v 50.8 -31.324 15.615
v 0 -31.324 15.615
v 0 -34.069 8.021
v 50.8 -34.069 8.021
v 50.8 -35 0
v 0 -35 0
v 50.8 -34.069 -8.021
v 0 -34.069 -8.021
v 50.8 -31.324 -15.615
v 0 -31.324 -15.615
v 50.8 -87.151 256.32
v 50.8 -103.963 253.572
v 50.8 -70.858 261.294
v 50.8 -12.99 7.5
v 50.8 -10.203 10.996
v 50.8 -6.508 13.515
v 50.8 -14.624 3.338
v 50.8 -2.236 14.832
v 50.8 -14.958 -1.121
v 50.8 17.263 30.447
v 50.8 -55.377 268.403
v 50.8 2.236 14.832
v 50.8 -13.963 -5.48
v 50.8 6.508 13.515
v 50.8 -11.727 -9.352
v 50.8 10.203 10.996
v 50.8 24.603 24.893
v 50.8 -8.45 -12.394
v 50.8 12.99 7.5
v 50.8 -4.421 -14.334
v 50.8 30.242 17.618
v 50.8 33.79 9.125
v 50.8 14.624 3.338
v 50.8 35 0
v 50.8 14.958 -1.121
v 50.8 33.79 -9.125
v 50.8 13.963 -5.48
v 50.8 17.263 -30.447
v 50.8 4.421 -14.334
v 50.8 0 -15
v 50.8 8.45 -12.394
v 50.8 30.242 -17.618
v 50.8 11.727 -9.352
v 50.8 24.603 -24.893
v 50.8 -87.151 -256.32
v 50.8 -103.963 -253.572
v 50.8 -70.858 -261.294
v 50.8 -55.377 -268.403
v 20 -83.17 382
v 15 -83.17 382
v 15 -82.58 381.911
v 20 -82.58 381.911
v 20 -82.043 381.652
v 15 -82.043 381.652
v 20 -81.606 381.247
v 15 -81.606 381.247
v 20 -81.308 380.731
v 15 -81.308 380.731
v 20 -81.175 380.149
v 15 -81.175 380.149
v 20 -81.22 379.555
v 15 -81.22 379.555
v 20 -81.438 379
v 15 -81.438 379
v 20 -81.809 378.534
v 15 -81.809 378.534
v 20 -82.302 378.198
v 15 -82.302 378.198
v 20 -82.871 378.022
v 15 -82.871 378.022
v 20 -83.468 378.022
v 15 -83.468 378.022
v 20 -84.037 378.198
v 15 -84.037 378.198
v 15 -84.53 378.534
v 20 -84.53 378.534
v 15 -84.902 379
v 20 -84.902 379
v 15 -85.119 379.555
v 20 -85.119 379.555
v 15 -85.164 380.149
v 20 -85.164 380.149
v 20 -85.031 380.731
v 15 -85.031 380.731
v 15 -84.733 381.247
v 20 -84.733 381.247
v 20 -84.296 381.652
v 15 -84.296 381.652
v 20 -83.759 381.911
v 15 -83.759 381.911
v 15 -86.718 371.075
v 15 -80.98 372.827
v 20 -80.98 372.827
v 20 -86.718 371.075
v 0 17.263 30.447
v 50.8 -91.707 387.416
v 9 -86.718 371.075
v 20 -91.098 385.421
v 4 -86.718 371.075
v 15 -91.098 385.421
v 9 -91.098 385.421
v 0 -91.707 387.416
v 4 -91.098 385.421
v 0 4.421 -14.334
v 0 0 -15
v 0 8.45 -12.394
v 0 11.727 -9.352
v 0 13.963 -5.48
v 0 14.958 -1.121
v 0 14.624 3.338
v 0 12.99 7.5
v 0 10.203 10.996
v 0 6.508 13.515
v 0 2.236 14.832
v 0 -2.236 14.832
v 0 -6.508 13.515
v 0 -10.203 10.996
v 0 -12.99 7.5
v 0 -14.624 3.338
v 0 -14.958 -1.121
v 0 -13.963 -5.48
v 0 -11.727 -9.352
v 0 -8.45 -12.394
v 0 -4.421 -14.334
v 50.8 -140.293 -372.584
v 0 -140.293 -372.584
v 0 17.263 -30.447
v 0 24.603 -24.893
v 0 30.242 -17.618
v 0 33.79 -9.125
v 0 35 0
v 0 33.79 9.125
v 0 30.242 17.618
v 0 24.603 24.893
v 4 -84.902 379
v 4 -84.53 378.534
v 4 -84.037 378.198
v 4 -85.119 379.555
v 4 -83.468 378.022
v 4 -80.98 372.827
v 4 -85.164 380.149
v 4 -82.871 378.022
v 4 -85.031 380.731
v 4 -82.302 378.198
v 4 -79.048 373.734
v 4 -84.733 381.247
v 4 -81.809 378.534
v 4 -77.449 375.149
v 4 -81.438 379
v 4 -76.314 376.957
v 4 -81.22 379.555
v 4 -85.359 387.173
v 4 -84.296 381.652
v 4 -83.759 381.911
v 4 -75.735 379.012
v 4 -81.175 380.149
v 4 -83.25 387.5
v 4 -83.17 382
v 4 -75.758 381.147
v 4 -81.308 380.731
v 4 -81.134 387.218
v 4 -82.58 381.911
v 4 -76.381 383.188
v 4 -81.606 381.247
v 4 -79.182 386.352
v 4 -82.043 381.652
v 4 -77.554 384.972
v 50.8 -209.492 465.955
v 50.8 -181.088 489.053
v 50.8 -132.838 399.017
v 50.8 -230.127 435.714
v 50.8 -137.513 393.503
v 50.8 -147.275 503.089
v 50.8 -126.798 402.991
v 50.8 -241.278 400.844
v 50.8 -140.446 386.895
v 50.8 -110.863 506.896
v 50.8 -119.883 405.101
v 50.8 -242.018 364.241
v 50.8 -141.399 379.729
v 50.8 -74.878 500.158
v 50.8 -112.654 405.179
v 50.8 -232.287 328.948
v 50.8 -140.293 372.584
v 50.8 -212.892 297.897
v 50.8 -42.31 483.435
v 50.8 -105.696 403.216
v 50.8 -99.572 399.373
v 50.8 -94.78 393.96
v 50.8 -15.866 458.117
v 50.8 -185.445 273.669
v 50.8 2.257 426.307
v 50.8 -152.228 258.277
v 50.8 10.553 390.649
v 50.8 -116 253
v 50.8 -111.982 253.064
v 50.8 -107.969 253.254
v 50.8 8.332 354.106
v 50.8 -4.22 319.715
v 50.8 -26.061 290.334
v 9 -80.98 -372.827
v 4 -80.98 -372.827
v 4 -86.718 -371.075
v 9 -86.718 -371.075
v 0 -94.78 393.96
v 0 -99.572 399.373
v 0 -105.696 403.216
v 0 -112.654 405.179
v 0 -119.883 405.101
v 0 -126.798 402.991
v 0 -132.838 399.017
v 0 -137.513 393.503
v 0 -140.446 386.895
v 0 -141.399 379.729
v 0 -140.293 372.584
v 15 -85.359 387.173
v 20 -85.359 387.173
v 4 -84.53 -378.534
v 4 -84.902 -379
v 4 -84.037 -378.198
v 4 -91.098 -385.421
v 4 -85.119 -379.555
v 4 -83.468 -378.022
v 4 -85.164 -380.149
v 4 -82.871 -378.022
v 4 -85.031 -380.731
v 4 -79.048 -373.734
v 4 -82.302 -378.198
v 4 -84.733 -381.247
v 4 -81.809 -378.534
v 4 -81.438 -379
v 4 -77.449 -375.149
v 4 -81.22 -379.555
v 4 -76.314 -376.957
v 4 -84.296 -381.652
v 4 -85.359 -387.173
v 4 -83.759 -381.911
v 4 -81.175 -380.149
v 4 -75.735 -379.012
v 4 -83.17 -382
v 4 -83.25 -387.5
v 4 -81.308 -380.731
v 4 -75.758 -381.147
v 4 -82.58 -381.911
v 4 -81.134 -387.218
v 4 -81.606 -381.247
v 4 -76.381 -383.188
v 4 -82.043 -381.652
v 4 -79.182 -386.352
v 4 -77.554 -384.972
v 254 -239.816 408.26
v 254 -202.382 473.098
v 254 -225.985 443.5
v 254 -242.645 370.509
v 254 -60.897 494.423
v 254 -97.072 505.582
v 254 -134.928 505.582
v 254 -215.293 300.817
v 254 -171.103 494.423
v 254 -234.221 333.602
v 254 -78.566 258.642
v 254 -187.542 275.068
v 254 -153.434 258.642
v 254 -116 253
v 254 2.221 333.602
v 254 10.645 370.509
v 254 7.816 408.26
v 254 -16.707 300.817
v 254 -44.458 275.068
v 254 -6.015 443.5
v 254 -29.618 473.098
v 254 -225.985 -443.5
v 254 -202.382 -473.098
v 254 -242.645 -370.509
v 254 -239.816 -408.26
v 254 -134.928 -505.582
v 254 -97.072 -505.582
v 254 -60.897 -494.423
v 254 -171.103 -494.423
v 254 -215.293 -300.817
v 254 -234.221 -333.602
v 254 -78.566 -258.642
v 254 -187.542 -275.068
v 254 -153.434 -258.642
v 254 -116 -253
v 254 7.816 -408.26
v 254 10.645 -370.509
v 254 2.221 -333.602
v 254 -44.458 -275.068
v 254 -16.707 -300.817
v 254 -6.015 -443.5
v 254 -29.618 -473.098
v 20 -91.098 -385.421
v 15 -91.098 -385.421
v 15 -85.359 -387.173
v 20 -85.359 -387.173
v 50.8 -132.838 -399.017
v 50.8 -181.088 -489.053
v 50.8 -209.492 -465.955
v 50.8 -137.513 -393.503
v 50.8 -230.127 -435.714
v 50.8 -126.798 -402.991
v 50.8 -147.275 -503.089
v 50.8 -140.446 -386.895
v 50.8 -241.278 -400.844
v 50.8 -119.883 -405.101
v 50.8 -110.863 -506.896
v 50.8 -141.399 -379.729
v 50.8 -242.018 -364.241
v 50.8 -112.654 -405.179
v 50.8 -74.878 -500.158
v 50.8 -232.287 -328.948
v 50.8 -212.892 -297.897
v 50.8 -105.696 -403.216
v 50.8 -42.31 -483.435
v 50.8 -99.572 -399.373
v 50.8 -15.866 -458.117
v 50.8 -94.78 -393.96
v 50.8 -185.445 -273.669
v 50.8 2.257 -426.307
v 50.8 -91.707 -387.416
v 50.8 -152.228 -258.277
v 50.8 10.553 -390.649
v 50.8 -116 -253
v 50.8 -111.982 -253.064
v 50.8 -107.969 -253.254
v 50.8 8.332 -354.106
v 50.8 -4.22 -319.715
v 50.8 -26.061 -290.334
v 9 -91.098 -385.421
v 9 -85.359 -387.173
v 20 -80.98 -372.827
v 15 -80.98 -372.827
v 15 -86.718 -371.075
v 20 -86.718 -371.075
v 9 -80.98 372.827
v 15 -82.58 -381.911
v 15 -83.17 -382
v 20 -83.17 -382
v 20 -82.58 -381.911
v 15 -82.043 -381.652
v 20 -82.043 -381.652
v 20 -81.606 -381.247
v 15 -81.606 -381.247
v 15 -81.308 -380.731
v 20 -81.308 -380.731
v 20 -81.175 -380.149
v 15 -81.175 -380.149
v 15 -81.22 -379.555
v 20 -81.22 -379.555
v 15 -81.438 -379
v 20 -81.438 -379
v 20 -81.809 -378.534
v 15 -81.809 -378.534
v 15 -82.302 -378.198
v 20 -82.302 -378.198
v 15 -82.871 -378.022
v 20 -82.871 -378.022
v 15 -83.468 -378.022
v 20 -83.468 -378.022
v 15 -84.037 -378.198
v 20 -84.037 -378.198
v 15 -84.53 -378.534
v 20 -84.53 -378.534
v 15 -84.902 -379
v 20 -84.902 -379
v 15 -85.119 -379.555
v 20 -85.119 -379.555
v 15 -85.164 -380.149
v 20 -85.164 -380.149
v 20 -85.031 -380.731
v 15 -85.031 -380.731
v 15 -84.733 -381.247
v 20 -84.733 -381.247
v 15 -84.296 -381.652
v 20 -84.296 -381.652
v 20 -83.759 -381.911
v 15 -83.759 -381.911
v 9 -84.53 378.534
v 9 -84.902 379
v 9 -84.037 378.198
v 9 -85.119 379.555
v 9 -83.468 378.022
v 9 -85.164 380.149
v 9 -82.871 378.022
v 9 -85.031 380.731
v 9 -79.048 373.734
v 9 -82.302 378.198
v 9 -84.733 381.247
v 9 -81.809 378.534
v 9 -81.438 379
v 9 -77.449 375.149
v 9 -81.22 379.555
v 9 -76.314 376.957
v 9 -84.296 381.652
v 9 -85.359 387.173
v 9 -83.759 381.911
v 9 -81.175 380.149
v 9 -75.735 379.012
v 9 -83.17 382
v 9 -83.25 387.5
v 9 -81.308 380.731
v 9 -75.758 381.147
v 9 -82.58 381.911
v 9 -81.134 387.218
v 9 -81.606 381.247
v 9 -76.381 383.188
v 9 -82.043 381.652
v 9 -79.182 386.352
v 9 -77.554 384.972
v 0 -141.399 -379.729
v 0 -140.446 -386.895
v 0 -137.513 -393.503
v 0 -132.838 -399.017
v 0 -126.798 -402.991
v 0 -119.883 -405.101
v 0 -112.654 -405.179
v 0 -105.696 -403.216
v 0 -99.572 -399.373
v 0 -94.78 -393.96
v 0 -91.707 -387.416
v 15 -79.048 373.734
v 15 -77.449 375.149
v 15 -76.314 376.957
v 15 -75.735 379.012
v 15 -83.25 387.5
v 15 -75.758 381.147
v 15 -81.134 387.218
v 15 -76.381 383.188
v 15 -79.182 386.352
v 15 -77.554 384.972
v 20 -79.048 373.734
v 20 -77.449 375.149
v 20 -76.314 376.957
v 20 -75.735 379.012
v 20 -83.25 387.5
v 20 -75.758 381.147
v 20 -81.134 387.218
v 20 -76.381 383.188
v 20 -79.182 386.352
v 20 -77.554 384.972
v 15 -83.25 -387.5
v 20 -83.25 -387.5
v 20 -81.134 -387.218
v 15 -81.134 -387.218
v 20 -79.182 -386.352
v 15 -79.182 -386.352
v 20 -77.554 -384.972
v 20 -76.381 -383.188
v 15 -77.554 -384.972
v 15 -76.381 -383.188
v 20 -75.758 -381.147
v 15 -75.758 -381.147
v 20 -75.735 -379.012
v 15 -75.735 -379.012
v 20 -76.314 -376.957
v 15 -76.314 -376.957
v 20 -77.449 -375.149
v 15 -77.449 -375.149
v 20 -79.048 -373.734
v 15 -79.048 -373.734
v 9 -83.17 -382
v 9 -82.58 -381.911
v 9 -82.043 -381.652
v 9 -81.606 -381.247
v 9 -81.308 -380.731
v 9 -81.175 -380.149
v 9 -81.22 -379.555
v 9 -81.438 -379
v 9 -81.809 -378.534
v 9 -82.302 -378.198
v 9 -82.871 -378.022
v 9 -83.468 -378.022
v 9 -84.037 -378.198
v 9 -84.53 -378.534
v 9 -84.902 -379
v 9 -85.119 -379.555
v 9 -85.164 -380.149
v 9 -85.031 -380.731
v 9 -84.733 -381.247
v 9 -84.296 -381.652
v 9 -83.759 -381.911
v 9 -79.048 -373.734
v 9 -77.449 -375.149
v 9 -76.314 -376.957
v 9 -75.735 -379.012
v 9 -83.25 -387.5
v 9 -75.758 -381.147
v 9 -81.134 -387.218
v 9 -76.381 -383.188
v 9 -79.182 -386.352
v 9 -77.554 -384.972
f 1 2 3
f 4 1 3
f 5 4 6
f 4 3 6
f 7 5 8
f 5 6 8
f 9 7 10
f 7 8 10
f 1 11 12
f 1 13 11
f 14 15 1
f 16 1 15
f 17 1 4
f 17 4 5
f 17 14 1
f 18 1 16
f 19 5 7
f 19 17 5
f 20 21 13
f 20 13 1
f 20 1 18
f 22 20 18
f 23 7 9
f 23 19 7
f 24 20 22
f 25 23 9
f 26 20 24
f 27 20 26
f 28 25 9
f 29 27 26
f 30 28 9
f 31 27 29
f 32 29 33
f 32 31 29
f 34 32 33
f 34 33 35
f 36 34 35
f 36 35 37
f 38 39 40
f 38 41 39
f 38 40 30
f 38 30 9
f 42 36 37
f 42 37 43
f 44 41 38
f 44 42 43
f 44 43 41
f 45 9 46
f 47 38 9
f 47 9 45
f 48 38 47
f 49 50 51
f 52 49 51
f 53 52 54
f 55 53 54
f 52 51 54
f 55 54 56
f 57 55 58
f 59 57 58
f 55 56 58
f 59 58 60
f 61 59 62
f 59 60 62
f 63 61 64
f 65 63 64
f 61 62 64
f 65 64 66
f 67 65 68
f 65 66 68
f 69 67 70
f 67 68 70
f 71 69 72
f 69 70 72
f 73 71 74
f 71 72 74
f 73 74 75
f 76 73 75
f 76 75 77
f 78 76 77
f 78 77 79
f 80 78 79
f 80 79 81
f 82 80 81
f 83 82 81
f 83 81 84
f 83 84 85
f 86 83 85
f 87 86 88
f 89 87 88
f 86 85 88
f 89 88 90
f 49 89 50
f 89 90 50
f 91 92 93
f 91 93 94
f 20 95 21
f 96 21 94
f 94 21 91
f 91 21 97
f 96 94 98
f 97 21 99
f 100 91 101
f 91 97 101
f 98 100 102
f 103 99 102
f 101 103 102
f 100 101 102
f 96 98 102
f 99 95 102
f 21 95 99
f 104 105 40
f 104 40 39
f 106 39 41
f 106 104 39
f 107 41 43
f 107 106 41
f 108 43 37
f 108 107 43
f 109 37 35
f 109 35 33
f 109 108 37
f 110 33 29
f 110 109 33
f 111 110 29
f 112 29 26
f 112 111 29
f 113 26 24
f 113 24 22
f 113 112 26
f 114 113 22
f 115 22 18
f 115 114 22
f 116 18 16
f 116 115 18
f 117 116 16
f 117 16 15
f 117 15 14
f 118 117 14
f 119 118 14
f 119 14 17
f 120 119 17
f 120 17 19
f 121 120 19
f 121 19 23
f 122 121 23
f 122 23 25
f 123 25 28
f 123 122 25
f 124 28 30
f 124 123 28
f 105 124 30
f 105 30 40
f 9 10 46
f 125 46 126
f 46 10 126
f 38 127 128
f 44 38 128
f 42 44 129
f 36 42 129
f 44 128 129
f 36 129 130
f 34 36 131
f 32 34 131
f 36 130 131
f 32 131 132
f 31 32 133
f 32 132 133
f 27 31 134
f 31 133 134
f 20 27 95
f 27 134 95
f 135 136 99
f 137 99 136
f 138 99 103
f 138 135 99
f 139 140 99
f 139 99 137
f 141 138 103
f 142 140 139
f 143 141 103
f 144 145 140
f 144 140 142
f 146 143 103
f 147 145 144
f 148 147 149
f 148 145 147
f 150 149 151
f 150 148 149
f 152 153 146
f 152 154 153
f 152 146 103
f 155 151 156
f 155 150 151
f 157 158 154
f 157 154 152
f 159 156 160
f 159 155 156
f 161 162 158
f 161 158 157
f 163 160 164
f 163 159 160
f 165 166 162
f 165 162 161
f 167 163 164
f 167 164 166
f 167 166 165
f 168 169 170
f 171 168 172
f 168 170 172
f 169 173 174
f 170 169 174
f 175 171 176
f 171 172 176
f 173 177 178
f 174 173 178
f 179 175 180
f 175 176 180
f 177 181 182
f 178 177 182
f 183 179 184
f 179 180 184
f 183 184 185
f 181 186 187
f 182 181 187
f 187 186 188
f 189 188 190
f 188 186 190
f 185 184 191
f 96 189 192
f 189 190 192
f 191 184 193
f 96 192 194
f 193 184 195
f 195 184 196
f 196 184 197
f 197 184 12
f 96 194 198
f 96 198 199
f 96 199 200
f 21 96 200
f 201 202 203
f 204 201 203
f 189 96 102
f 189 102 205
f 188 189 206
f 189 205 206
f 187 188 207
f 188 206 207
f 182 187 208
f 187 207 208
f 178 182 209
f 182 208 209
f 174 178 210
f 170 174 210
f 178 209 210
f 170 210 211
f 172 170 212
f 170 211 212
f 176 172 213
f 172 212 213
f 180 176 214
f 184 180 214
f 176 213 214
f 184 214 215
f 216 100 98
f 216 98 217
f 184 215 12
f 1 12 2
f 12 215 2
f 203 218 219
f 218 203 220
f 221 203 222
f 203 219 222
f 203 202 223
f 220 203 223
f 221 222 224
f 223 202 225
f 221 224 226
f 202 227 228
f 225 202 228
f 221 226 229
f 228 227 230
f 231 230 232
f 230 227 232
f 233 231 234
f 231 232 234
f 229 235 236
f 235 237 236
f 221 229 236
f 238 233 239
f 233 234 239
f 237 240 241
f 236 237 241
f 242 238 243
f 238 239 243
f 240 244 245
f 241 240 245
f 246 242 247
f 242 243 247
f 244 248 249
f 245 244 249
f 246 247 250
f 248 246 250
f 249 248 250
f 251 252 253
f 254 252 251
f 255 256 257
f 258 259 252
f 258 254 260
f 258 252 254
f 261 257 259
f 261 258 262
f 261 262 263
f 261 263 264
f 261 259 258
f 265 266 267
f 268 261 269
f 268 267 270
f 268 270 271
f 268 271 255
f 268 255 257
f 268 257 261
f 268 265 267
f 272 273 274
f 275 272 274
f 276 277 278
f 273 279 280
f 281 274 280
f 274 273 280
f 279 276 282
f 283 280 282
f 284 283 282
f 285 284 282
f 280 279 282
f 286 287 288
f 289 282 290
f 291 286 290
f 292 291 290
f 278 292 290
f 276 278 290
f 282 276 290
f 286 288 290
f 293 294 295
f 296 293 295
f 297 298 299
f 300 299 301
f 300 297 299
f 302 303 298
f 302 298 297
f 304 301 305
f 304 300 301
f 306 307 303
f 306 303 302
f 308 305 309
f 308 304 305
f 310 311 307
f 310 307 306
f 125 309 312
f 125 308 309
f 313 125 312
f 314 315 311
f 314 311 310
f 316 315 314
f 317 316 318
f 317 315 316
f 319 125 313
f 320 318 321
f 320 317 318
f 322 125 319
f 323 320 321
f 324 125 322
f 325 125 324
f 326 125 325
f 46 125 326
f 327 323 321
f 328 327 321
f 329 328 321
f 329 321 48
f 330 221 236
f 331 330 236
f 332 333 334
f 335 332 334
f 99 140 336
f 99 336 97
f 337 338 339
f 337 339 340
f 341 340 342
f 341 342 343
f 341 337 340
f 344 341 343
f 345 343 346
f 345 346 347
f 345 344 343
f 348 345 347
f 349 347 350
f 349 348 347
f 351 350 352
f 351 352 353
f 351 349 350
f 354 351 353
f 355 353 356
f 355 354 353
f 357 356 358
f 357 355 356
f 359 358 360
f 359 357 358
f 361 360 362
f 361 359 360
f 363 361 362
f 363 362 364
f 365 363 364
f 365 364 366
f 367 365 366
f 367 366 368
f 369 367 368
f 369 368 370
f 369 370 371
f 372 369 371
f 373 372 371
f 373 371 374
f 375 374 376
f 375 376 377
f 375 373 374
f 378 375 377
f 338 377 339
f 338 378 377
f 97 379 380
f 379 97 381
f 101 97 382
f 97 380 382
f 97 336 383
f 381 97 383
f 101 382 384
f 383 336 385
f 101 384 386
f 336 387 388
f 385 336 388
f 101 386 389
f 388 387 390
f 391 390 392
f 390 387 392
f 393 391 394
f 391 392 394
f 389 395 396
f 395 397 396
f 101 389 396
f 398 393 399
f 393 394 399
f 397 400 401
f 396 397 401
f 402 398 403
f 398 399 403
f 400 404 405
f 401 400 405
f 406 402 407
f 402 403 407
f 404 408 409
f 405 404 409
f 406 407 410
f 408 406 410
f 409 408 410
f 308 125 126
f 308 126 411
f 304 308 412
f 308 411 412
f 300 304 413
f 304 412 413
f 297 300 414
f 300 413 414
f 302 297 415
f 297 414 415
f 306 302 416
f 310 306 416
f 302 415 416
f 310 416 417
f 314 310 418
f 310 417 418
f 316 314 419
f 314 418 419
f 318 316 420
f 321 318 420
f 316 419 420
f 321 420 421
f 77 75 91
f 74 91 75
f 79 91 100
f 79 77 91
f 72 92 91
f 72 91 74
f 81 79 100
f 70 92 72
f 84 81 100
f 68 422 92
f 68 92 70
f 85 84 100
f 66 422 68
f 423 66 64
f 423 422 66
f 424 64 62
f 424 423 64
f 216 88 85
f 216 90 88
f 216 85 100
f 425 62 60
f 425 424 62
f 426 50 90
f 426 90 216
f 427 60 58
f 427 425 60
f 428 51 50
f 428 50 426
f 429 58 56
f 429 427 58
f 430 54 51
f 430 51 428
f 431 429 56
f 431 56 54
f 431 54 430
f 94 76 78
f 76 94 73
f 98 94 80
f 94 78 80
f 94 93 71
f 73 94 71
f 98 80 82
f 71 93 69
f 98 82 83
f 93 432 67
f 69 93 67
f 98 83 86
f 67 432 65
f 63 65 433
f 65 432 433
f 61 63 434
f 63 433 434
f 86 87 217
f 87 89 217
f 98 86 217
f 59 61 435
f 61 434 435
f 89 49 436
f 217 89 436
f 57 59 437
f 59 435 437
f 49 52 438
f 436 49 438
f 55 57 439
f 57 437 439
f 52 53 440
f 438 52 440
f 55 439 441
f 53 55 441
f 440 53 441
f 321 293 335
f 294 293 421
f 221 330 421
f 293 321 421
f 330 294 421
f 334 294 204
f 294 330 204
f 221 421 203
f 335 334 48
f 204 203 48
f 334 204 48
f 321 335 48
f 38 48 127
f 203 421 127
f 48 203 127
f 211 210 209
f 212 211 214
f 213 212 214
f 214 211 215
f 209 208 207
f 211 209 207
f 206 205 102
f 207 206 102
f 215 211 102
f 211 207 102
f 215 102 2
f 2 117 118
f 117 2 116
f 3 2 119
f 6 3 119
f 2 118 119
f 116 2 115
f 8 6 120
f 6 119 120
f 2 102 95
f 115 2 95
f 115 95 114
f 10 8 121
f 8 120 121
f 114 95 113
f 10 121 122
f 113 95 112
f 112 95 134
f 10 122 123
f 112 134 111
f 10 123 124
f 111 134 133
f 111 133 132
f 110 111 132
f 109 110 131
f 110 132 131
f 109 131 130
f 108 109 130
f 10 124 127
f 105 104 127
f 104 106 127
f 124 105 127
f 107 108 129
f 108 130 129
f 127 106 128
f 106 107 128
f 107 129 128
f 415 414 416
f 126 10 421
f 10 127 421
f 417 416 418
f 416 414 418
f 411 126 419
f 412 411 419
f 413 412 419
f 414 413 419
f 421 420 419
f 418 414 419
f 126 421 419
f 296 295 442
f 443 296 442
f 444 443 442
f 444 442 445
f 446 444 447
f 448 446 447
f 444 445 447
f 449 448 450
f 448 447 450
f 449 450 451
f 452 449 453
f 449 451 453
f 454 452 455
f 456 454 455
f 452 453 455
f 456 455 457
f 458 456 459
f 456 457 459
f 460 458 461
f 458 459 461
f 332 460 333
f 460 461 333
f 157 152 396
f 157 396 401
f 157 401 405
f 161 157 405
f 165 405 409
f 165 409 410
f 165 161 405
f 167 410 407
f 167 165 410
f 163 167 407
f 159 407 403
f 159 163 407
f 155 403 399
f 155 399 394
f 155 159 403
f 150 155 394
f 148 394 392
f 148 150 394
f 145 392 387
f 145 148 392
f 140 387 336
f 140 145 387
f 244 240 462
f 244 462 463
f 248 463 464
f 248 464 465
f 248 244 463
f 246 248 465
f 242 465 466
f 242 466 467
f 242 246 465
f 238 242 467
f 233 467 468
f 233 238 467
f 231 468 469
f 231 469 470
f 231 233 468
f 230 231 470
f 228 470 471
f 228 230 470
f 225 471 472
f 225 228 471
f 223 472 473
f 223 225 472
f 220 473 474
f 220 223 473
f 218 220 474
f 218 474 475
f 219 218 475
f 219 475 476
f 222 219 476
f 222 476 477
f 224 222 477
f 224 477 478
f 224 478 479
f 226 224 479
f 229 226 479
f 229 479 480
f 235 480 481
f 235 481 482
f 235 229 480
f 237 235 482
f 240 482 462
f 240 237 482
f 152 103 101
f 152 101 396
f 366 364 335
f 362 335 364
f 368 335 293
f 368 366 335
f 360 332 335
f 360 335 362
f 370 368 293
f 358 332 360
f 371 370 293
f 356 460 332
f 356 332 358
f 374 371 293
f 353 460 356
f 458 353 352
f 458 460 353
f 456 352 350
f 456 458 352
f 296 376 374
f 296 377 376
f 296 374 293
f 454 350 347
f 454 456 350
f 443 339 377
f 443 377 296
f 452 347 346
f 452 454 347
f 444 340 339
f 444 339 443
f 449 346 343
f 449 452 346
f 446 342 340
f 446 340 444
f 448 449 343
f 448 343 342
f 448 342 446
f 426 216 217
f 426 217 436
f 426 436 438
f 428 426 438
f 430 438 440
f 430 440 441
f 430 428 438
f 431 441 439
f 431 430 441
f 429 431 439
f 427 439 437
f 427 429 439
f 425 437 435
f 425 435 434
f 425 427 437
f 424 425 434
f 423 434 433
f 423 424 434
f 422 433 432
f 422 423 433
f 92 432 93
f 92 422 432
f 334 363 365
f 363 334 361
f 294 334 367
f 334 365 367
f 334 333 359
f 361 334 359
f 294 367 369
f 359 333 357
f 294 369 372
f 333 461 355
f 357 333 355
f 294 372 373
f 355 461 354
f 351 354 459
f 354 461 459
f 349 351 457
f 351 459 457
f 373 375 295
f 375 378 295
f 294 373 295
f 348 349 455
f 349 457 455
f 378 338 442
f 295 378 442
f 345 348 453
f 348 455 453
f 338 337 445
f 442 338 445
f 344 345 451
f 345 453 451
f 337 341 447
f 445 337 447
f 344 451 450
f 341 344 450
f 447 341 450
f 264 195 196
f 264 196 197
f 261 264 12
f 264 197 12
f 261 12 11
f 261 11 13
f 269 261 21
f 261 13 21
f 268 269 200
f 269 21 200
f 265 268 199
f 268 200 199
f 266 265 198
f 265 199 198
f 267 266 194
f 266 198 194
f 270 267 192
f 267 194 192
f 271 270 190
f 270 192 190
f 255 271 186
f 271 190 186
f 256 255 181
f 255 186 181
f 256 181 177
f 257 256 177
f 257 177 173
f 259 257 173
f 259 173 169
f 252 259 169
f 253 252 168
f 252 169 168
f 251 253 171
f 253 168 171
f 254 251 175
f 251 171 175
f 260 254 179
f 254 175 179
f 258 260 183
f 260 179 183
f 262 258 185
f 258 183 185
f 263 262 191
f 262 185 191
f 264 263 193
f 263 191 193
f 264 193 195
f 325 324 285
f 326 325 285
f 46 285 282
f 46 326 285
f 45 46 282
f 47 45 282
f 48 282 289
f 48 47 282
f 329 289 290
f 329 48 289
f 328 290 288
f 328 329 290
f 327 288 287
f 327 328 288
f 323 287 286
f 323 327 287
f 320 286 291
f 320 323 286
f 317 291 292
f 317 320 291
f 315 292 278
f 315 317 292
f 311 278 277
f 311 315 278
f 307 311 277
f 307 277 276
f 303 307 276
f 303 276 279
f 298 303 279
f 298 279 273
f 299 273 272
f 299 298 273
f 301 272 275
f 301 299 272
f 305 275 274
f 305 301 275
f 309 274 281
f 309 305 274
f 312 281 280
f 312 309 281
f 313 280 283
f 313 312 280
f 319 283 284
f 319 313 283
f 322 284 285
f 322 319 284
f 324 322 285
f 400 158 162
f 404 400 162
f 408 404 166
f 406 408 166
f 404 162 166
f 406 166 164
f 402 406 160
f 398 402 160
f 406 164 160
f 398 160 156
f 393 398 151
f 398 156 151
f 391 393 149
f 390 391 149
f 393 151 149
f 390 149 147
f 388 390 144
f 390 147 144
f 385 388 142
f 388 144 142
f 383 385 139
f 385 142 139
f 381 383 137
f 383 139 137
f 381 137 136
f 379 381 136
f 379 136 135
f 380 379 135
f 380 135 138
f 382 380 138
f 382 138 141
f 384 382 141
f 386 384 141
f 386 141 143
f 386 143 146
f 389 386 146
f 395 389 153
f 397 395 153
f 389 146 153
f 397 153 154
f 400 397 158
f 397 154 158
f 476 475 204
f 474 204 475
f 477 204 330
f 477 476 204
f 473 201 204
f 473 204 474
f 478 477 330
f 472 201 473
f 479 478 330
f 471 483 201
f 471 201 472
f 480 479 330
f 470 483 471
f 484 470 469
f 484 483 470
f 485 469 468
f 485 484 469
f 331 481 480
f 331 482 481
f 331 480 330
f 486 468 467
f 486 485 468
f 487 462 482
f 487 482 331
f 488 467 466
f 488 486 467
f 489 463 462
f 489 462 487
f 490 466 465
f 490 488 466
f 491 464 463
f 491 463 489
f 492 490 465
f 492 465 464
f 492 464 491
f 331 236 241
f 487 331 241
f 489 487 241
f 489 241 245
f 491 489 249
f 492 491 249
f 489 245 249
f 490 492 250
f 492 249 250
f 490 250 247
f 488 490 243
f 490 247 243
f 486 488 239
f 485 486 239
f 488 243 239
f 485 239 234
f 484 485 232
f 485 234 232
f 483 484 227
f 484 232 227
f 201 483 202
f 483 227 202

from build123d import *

# Parameters (mm, degrees)
SKETCH1_R           = 15
BOSS_EXTRUDE1_DEPTH = 50.8
SKETCH2_R           = 127
BOSS_EXTRUDE2_DEPTH = 203.2
BOSS_EXTRUDE3_START = -4
SKETCH3_R           = 2
BOSS_EXTRUDE3_DEPTH = 5
BOSS_EXTRUDE4_START = -15
SKETCH3_2_R         = 2
BOSS_EXTRUDE4_DEPTH = 5


with BuildPart() as part:
    # Sketch1 → Boss-Extrude1 (new body)
    with BuildSketch(Plane(origin=(0, 0, 0), x_dir=(0, 0, -1), z_dir=(1, 0, 0))):
        with BuildLine():
            ThreePointArc((-387.415853794, -91.706685848), (-404.293314152, -123.415853794), (-372.584146206, -140.293314152))
            Line((-372.584146206, -140.293314152), (-15.614846066, -31.32373832))
            ThreePointArc((-15.614846066, -31.32373832), (0, -35), (15.614846066, -31.32373832))
            Line((15.614846066, -31.32373832), (372.584146206, -140.293314152))
            ThreePointArc((372.584146206, -140.293314152), (404.293314152, -123.415853794), (387.415853794, -91.706685848))
            Line((387.415853794, -91.706685848), (30.446553653, 17.262889985))
            ThreePointArc((30.446553653, 17.262889985), (0, 35), (-30.446553653, 17.262889985))
            Line((-30.446553653, 17.262889985), (-387.415853794, -91.706685848))
        make_face()
        Circle(SKETCH1_R, mode=Mode.SUBTRACT)
    extrude(amount=BOSS_EXTRUDE1_DEPTH)

    # Sketch2 → Boss-Extrude2 (add)
    with BuildSketch(Plane(origin=(50.8, 0, 0), x_dir=(0, 0, -1), z_dir=(1, 0, 0))):
        with Locations((-380, -116)):
            Circle(SKETCH2_R)
    boss_extrude2 = extrude(amount=BOSS_EXTRUDE2_DEPTH)

    # Sketch3 → Boss-Extrude3 (add)
    with BuildSketch(Plane.ZY.offset(BOSS_EXTRUDE3_START)):
        with BuildLine():
            Line((372.826777317, -80.979847323), (371.07500083, -86.718425469))
            Line((371.07500083, -86.718425469), (385.421446196, -91.097866686))
            Line((385.421446196, -91.097866686), (387.173222683, -85.35928854))
            ThreePointArc((387.173222683, -85.35928854), (382.189720608, -75.996345249), (372.826777317, -80.979847323))
        make_face()
        with Locations((380, -83.169567931)):
            Circle(SKETCH3_R, mode=Mode.SUBTRACT)
    boss_extrude3 = extrude(amount=-BOSS_EXTRUDE3_DEPTH)

    # Sketch3<2> → Boss-Extrude4 (add)
    with BuildSketch(Plane.ZY.offset(BOSS_EXTRUDE4_START)):
        with BuildLine():
            Line((372.826777317, -80.979847323), (371.07500083, -86.718425469))
            Line((371.07500083, -86.718425469), (385.421446196, -91.097866686))
            Line((385.421446196, -91.097866686), (387.173222683, -85.35928854))
            ThreePointArc((387.173222683, -85.35928854), (382.189720608, -75.996345249), (372.826777317, -80.979847323))
        make_face()
        with Locations((380, -83.169567931)):
            Circle(SKETCH3_2_R, mode=Mode.SUBTRACT)
    boss_extrude4 = extrude(amount=-BOSS_EXTRUDE4_DEPTH)

    # Mirror1: Boss-Extrude2, Boss-Extrude3, Boss-Extrude4 across plane
    add(boss_extrude2.mirror(Plane.XY))
    add(boss_extrude3.mirror(Plane.XY))
    add(boss_extrude4.mirror(Plane.XY))


solid = part.part
